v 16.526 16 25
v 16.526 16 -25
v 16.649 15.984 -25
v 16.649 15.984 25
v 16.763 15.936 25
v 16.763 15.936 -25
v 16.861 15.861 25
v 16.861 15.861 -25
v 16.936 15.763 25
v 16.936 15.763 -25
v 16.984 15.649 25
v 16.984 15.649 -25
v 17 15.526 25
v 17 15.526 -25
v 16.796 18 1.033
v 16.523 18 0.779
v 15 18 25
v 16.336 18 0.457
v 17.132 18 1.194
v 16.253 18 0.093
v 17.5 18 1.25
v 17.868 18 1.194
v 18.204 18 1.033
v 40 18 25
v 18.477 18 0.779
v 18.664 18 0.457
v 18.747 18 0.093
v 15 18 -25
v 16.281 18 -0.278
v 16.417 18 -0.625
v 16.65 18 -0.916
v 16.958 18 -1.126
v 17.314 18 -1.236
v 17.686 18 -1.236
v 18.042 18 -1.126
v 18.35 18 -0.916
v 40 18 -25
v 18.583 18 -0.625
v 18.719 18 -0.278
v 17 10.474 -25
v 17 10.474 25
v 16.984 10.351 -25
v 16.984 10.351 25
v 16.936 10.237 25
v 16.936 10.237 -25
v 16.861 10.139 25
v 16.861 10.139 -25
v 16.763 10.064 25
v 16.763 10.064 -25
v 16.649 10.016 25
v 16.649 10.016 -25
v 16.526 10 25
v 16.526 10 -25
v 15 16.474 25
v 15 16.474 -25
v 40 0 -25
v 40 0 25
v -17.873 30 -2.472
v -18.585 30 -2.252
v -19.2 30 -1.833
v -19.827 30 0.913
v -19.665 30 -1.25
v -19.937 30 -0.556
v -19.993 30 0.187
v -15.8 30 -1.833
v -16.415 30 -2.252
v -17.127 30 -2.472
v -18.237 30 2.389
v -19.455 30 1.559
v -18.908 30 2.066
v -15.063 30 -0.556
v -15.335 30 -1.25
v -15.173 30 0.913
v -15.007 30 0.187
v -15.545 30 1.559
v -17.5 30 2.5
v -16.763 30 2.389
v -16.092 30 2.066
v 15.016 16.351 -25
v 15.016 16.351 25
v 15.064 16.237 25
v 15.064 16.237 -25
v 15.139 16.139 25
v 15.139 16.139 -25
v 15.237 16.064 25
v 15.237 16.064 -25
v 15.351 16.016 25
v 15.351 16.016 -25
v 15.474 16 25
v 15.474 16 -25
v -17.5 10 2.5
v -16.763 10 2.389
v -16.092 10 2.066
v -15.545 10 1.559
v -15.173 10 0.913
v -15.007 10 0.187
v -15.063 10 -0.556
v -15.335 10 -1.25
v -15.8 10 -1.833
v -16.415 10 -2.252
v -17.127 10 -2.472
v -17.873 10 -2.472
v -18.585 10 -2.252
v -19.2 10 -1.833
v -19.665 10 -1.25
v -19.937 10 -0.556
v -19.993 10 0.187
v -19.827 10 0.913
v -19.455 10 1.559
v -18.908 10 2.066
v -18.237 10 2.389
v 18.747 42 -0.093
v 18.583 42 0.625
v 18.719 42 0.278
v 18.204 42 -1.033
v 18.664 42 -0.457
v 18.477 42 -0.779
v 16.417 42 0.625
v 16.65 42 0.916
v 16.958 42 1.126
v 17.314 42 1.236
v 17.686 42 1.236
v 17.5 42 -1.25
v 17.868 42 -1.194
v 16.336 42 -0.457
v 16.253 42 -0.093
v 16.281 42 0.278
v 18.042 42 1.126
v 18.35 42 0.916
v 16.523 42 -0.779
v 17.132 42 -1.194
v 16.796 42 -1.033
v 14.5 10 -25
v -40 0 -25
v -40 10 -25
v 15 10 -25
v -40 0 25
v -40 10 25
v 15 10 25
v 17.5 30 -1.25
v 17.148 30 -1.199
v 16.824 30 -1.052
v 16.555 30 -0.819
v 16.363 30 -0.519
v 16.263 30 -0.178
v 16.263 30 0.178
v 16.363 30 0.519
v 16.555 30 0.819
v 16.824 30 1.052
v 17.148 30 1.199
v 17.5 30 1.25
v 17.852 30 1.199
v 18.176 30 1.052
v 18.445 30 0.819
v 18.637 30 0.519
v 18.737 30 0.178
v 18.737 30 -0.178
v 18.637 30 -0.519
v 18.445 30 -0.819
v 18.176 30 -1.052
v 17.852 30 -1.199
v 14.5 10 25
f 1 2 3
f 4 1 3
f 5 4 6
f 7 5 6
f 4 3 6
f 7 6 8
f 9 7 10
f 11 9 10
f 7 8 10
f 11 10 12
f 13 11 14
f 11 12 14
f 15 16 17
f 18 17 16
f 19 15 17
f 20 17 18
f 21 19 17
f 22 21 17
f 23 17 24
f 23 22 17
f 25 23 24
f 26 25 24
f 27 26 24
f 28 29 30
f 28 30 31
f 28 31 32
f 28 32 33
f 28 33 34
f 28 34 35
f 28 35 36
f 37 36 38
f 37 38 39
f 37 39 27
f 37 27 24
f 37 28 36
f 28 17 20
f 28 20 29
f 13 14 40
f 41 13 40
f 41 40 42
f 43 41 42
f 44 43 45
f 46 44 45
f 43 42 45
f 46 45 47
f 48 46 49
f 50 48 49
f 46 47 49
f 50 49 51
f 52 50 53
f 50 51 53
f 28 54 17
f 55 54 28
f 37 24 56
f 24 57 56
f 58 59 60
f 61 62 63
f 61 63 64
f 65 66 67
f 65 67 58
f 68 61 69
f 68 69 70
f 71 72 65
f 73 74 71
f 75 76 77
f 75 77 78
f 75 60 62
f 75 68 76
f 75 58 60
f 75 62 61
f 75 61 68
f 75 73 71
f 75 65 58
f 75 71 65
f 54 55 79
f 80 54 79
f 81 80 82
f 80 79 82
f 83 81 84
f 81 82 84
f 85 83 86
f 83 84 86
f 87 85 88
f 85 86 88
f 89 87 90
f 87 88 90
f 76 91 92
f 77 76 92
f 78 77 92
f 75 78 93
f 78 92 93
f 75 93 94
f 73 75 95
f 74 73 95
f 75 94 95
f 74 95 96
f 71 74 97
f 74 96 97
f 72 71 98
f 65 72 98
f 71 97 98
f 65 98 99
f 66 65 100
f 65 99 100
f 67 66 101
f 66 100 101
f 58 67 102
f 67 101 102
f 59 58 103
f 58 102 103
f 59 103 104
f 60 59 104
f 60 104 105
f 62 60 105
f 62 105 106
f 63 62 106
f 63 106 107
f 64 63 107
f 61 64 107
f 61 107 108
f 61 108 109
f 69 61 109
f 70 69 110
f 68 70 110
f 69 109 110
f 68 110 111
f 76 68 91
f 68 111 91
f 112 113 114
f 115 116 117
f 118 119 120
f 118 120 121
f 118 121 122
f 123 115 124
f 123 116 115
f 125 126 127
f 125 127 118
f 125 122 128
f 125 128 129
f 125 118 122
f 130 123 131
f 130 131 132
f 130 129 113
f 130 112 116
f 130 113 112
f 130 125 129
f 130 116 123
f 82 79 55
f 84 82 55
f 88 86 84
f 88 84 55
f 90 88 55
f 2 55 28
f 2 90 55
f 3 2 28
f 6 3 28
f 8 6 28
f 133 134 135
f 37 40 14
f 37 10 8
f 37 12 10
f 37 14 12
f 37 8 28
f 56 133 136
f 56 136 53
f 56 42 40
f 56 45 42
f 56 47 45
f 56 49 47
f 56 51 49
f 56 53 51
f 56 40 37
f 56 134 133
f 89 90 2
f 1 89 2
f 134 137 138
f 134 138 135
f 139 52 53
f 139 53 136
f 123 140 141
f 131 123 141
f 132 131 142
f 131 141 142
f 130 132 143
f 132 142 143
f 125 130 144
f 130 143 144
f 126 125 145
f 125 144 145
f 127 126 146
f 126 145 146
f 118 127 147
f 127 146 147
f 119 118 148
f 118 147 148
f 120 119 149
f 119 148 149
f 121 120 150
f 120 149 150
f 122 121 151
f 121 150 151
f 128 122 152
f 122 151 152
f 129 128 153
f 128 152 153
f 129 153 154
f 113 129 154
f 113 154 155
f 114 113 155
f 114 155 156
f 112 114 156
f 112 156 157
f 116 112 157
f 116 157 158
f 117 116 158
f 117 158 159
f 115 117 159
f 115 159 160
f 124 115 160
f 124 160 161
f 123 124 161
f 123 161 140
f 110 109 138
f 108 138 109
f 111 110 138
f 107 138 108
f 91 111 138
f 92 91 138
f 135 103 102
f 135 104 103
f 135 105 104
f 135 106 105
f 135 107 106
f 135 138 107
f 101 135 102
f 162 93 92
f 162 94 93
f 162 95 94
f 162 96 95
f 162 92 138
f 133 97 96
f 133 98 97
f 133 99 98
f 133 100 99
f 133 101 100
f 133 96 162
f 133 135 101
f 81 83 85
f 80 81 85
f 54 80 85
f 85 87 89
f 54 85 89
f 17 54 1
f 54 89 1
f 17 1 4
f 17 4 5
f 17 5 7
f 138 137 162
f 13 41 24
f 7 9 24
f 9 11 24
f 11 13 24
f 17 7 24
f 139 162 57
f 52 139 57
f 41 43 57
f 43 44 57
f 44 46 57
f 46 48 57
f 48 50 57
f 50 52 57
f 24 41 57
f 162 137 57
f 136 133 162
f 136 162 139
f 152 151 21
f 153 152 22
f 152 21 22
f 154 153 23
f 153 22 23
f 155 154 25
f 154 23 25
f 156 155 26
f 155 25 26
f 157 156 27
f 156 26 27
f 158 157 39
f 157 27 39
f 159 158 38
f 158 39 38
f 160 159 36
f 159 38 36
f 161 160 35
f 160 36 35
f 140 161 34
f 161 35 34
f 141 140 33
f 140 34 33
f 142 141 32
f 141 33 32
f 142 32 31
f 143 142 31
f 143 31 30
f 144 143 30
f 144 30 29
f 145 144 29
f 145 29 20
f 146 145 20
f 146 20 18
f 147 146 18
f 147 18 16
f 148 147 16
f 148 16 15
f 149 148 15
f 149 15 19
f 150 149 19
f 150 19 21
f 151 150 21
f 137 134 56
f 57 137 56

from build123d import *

# Parameters (mm, degrees)
SKETCH_1_W          = 80
SKETCH_1_H          = 50
EXTRUDE_1_DEPTH     = 10
SKETCH_2_R          = 2.5
SKETCH_2_R_2        = 1.25
EXTRUDE_2_DEPTH     = 20
SKETCH_4_W          = 25
SKETCH_4_H          = 50
EXTRUDE_3_DEPTH     = 8
SKETCH_5_R          = 1.25
EXTRUDE_4_DEPTH     = 12
CUT_EXTRUDE_1_DEPTH = 77.576758876


with BuildPart() as part:
    # 草圖1 → 填料-伸長1 (new body)
    with BuildSketch(Plane(origin=(0, 0, 0), x_dir=(1, 0, 0), z_dir=(0, 1, 0))):
        Rectangle(SKETCH_1_W, SKETCH_1_H)
    extrude(amount=EXTRUDE_1_DEPTH)

    # 草圖2 → 填料-伸長2 (add)
    with BuildSketch(Plane(origin=(0, 10, 0), x_dir=(1, 0, 0), z_dir=(0, 1, 0))):
        with Locations(Location((-17.5, 0, 0), (0, 0, 270))):
            Circle(SKETCH_2_R)
        with Locations(Location((17.5, 0, 0), (0, 0, 270))):
            Circle(SKETCH_2_R_2)
    extrude(amount=EXTRUDE_2_DEPTH)

    # 草圖4 → 填料-伸長3 (add)
    with BuildSketch(Plane(origin=(0, 10, 0), x_dir=(1, 0, 0), z_dir=(0, 1, 0))):
        with Locations((27.5, 0)):
            Rectangle(SKETCH_4_W, SKETCH_4_H)
    extrude(amount=EXTRUDE_3_DEPTH)

    # 草圖5 → 填料-伸長4 (add)
    with BuildSketch(Plane(origin=(0, 30, 0), x_dir=(1, 0, 0), z_dir=(0, 1, 0))):
        with Locations(Location((17.5, 0, 0), (0, 0, 90))):
            Circle(SKETCH_5_R)
    extrude(amount=EXTRUDE_4_DEPTH)

    # 草圖7 → 除料-伸長1 (cut, through all)
    with BuildSketch(Plane(origin=(0, 0, -25), x_dir=(-1, 0, 0), z_dir=(0, 0, -1))):
        with BuildLine():
            Line((-15.473976981, 16), (-16.526023019, 16))
            ThreePointArc((-16.526023019, 16), (-16.861175356, 15.861175356), (-17, 15.526023019))
            Line((-17, 15.526023019), (-17, 10.473976981))
            ThreePointArc((-17, 10.473976981), (-16.861175356, 10.138824644), (-16.526023019, 10))
            Line((-16.526023019, 10), (-15, 10))
            Line((-15, 10), (-14.5, 10))
            Line((-14.5, 10), (-14.5, 18))
            Line((-14.5, 18), (-15, 18))
            Line((-15, 18), (-15, 16.473976981))
            ThreePointArc((-15, 16.473976981), (-15.138824644, 16.138824644), (-15.473976981, 16))
        make_face()
    extrude(amount=-CUT_EXTRUDE_1_DEPTH, mode=Mode.SUBTRACT)


solid = part.part
